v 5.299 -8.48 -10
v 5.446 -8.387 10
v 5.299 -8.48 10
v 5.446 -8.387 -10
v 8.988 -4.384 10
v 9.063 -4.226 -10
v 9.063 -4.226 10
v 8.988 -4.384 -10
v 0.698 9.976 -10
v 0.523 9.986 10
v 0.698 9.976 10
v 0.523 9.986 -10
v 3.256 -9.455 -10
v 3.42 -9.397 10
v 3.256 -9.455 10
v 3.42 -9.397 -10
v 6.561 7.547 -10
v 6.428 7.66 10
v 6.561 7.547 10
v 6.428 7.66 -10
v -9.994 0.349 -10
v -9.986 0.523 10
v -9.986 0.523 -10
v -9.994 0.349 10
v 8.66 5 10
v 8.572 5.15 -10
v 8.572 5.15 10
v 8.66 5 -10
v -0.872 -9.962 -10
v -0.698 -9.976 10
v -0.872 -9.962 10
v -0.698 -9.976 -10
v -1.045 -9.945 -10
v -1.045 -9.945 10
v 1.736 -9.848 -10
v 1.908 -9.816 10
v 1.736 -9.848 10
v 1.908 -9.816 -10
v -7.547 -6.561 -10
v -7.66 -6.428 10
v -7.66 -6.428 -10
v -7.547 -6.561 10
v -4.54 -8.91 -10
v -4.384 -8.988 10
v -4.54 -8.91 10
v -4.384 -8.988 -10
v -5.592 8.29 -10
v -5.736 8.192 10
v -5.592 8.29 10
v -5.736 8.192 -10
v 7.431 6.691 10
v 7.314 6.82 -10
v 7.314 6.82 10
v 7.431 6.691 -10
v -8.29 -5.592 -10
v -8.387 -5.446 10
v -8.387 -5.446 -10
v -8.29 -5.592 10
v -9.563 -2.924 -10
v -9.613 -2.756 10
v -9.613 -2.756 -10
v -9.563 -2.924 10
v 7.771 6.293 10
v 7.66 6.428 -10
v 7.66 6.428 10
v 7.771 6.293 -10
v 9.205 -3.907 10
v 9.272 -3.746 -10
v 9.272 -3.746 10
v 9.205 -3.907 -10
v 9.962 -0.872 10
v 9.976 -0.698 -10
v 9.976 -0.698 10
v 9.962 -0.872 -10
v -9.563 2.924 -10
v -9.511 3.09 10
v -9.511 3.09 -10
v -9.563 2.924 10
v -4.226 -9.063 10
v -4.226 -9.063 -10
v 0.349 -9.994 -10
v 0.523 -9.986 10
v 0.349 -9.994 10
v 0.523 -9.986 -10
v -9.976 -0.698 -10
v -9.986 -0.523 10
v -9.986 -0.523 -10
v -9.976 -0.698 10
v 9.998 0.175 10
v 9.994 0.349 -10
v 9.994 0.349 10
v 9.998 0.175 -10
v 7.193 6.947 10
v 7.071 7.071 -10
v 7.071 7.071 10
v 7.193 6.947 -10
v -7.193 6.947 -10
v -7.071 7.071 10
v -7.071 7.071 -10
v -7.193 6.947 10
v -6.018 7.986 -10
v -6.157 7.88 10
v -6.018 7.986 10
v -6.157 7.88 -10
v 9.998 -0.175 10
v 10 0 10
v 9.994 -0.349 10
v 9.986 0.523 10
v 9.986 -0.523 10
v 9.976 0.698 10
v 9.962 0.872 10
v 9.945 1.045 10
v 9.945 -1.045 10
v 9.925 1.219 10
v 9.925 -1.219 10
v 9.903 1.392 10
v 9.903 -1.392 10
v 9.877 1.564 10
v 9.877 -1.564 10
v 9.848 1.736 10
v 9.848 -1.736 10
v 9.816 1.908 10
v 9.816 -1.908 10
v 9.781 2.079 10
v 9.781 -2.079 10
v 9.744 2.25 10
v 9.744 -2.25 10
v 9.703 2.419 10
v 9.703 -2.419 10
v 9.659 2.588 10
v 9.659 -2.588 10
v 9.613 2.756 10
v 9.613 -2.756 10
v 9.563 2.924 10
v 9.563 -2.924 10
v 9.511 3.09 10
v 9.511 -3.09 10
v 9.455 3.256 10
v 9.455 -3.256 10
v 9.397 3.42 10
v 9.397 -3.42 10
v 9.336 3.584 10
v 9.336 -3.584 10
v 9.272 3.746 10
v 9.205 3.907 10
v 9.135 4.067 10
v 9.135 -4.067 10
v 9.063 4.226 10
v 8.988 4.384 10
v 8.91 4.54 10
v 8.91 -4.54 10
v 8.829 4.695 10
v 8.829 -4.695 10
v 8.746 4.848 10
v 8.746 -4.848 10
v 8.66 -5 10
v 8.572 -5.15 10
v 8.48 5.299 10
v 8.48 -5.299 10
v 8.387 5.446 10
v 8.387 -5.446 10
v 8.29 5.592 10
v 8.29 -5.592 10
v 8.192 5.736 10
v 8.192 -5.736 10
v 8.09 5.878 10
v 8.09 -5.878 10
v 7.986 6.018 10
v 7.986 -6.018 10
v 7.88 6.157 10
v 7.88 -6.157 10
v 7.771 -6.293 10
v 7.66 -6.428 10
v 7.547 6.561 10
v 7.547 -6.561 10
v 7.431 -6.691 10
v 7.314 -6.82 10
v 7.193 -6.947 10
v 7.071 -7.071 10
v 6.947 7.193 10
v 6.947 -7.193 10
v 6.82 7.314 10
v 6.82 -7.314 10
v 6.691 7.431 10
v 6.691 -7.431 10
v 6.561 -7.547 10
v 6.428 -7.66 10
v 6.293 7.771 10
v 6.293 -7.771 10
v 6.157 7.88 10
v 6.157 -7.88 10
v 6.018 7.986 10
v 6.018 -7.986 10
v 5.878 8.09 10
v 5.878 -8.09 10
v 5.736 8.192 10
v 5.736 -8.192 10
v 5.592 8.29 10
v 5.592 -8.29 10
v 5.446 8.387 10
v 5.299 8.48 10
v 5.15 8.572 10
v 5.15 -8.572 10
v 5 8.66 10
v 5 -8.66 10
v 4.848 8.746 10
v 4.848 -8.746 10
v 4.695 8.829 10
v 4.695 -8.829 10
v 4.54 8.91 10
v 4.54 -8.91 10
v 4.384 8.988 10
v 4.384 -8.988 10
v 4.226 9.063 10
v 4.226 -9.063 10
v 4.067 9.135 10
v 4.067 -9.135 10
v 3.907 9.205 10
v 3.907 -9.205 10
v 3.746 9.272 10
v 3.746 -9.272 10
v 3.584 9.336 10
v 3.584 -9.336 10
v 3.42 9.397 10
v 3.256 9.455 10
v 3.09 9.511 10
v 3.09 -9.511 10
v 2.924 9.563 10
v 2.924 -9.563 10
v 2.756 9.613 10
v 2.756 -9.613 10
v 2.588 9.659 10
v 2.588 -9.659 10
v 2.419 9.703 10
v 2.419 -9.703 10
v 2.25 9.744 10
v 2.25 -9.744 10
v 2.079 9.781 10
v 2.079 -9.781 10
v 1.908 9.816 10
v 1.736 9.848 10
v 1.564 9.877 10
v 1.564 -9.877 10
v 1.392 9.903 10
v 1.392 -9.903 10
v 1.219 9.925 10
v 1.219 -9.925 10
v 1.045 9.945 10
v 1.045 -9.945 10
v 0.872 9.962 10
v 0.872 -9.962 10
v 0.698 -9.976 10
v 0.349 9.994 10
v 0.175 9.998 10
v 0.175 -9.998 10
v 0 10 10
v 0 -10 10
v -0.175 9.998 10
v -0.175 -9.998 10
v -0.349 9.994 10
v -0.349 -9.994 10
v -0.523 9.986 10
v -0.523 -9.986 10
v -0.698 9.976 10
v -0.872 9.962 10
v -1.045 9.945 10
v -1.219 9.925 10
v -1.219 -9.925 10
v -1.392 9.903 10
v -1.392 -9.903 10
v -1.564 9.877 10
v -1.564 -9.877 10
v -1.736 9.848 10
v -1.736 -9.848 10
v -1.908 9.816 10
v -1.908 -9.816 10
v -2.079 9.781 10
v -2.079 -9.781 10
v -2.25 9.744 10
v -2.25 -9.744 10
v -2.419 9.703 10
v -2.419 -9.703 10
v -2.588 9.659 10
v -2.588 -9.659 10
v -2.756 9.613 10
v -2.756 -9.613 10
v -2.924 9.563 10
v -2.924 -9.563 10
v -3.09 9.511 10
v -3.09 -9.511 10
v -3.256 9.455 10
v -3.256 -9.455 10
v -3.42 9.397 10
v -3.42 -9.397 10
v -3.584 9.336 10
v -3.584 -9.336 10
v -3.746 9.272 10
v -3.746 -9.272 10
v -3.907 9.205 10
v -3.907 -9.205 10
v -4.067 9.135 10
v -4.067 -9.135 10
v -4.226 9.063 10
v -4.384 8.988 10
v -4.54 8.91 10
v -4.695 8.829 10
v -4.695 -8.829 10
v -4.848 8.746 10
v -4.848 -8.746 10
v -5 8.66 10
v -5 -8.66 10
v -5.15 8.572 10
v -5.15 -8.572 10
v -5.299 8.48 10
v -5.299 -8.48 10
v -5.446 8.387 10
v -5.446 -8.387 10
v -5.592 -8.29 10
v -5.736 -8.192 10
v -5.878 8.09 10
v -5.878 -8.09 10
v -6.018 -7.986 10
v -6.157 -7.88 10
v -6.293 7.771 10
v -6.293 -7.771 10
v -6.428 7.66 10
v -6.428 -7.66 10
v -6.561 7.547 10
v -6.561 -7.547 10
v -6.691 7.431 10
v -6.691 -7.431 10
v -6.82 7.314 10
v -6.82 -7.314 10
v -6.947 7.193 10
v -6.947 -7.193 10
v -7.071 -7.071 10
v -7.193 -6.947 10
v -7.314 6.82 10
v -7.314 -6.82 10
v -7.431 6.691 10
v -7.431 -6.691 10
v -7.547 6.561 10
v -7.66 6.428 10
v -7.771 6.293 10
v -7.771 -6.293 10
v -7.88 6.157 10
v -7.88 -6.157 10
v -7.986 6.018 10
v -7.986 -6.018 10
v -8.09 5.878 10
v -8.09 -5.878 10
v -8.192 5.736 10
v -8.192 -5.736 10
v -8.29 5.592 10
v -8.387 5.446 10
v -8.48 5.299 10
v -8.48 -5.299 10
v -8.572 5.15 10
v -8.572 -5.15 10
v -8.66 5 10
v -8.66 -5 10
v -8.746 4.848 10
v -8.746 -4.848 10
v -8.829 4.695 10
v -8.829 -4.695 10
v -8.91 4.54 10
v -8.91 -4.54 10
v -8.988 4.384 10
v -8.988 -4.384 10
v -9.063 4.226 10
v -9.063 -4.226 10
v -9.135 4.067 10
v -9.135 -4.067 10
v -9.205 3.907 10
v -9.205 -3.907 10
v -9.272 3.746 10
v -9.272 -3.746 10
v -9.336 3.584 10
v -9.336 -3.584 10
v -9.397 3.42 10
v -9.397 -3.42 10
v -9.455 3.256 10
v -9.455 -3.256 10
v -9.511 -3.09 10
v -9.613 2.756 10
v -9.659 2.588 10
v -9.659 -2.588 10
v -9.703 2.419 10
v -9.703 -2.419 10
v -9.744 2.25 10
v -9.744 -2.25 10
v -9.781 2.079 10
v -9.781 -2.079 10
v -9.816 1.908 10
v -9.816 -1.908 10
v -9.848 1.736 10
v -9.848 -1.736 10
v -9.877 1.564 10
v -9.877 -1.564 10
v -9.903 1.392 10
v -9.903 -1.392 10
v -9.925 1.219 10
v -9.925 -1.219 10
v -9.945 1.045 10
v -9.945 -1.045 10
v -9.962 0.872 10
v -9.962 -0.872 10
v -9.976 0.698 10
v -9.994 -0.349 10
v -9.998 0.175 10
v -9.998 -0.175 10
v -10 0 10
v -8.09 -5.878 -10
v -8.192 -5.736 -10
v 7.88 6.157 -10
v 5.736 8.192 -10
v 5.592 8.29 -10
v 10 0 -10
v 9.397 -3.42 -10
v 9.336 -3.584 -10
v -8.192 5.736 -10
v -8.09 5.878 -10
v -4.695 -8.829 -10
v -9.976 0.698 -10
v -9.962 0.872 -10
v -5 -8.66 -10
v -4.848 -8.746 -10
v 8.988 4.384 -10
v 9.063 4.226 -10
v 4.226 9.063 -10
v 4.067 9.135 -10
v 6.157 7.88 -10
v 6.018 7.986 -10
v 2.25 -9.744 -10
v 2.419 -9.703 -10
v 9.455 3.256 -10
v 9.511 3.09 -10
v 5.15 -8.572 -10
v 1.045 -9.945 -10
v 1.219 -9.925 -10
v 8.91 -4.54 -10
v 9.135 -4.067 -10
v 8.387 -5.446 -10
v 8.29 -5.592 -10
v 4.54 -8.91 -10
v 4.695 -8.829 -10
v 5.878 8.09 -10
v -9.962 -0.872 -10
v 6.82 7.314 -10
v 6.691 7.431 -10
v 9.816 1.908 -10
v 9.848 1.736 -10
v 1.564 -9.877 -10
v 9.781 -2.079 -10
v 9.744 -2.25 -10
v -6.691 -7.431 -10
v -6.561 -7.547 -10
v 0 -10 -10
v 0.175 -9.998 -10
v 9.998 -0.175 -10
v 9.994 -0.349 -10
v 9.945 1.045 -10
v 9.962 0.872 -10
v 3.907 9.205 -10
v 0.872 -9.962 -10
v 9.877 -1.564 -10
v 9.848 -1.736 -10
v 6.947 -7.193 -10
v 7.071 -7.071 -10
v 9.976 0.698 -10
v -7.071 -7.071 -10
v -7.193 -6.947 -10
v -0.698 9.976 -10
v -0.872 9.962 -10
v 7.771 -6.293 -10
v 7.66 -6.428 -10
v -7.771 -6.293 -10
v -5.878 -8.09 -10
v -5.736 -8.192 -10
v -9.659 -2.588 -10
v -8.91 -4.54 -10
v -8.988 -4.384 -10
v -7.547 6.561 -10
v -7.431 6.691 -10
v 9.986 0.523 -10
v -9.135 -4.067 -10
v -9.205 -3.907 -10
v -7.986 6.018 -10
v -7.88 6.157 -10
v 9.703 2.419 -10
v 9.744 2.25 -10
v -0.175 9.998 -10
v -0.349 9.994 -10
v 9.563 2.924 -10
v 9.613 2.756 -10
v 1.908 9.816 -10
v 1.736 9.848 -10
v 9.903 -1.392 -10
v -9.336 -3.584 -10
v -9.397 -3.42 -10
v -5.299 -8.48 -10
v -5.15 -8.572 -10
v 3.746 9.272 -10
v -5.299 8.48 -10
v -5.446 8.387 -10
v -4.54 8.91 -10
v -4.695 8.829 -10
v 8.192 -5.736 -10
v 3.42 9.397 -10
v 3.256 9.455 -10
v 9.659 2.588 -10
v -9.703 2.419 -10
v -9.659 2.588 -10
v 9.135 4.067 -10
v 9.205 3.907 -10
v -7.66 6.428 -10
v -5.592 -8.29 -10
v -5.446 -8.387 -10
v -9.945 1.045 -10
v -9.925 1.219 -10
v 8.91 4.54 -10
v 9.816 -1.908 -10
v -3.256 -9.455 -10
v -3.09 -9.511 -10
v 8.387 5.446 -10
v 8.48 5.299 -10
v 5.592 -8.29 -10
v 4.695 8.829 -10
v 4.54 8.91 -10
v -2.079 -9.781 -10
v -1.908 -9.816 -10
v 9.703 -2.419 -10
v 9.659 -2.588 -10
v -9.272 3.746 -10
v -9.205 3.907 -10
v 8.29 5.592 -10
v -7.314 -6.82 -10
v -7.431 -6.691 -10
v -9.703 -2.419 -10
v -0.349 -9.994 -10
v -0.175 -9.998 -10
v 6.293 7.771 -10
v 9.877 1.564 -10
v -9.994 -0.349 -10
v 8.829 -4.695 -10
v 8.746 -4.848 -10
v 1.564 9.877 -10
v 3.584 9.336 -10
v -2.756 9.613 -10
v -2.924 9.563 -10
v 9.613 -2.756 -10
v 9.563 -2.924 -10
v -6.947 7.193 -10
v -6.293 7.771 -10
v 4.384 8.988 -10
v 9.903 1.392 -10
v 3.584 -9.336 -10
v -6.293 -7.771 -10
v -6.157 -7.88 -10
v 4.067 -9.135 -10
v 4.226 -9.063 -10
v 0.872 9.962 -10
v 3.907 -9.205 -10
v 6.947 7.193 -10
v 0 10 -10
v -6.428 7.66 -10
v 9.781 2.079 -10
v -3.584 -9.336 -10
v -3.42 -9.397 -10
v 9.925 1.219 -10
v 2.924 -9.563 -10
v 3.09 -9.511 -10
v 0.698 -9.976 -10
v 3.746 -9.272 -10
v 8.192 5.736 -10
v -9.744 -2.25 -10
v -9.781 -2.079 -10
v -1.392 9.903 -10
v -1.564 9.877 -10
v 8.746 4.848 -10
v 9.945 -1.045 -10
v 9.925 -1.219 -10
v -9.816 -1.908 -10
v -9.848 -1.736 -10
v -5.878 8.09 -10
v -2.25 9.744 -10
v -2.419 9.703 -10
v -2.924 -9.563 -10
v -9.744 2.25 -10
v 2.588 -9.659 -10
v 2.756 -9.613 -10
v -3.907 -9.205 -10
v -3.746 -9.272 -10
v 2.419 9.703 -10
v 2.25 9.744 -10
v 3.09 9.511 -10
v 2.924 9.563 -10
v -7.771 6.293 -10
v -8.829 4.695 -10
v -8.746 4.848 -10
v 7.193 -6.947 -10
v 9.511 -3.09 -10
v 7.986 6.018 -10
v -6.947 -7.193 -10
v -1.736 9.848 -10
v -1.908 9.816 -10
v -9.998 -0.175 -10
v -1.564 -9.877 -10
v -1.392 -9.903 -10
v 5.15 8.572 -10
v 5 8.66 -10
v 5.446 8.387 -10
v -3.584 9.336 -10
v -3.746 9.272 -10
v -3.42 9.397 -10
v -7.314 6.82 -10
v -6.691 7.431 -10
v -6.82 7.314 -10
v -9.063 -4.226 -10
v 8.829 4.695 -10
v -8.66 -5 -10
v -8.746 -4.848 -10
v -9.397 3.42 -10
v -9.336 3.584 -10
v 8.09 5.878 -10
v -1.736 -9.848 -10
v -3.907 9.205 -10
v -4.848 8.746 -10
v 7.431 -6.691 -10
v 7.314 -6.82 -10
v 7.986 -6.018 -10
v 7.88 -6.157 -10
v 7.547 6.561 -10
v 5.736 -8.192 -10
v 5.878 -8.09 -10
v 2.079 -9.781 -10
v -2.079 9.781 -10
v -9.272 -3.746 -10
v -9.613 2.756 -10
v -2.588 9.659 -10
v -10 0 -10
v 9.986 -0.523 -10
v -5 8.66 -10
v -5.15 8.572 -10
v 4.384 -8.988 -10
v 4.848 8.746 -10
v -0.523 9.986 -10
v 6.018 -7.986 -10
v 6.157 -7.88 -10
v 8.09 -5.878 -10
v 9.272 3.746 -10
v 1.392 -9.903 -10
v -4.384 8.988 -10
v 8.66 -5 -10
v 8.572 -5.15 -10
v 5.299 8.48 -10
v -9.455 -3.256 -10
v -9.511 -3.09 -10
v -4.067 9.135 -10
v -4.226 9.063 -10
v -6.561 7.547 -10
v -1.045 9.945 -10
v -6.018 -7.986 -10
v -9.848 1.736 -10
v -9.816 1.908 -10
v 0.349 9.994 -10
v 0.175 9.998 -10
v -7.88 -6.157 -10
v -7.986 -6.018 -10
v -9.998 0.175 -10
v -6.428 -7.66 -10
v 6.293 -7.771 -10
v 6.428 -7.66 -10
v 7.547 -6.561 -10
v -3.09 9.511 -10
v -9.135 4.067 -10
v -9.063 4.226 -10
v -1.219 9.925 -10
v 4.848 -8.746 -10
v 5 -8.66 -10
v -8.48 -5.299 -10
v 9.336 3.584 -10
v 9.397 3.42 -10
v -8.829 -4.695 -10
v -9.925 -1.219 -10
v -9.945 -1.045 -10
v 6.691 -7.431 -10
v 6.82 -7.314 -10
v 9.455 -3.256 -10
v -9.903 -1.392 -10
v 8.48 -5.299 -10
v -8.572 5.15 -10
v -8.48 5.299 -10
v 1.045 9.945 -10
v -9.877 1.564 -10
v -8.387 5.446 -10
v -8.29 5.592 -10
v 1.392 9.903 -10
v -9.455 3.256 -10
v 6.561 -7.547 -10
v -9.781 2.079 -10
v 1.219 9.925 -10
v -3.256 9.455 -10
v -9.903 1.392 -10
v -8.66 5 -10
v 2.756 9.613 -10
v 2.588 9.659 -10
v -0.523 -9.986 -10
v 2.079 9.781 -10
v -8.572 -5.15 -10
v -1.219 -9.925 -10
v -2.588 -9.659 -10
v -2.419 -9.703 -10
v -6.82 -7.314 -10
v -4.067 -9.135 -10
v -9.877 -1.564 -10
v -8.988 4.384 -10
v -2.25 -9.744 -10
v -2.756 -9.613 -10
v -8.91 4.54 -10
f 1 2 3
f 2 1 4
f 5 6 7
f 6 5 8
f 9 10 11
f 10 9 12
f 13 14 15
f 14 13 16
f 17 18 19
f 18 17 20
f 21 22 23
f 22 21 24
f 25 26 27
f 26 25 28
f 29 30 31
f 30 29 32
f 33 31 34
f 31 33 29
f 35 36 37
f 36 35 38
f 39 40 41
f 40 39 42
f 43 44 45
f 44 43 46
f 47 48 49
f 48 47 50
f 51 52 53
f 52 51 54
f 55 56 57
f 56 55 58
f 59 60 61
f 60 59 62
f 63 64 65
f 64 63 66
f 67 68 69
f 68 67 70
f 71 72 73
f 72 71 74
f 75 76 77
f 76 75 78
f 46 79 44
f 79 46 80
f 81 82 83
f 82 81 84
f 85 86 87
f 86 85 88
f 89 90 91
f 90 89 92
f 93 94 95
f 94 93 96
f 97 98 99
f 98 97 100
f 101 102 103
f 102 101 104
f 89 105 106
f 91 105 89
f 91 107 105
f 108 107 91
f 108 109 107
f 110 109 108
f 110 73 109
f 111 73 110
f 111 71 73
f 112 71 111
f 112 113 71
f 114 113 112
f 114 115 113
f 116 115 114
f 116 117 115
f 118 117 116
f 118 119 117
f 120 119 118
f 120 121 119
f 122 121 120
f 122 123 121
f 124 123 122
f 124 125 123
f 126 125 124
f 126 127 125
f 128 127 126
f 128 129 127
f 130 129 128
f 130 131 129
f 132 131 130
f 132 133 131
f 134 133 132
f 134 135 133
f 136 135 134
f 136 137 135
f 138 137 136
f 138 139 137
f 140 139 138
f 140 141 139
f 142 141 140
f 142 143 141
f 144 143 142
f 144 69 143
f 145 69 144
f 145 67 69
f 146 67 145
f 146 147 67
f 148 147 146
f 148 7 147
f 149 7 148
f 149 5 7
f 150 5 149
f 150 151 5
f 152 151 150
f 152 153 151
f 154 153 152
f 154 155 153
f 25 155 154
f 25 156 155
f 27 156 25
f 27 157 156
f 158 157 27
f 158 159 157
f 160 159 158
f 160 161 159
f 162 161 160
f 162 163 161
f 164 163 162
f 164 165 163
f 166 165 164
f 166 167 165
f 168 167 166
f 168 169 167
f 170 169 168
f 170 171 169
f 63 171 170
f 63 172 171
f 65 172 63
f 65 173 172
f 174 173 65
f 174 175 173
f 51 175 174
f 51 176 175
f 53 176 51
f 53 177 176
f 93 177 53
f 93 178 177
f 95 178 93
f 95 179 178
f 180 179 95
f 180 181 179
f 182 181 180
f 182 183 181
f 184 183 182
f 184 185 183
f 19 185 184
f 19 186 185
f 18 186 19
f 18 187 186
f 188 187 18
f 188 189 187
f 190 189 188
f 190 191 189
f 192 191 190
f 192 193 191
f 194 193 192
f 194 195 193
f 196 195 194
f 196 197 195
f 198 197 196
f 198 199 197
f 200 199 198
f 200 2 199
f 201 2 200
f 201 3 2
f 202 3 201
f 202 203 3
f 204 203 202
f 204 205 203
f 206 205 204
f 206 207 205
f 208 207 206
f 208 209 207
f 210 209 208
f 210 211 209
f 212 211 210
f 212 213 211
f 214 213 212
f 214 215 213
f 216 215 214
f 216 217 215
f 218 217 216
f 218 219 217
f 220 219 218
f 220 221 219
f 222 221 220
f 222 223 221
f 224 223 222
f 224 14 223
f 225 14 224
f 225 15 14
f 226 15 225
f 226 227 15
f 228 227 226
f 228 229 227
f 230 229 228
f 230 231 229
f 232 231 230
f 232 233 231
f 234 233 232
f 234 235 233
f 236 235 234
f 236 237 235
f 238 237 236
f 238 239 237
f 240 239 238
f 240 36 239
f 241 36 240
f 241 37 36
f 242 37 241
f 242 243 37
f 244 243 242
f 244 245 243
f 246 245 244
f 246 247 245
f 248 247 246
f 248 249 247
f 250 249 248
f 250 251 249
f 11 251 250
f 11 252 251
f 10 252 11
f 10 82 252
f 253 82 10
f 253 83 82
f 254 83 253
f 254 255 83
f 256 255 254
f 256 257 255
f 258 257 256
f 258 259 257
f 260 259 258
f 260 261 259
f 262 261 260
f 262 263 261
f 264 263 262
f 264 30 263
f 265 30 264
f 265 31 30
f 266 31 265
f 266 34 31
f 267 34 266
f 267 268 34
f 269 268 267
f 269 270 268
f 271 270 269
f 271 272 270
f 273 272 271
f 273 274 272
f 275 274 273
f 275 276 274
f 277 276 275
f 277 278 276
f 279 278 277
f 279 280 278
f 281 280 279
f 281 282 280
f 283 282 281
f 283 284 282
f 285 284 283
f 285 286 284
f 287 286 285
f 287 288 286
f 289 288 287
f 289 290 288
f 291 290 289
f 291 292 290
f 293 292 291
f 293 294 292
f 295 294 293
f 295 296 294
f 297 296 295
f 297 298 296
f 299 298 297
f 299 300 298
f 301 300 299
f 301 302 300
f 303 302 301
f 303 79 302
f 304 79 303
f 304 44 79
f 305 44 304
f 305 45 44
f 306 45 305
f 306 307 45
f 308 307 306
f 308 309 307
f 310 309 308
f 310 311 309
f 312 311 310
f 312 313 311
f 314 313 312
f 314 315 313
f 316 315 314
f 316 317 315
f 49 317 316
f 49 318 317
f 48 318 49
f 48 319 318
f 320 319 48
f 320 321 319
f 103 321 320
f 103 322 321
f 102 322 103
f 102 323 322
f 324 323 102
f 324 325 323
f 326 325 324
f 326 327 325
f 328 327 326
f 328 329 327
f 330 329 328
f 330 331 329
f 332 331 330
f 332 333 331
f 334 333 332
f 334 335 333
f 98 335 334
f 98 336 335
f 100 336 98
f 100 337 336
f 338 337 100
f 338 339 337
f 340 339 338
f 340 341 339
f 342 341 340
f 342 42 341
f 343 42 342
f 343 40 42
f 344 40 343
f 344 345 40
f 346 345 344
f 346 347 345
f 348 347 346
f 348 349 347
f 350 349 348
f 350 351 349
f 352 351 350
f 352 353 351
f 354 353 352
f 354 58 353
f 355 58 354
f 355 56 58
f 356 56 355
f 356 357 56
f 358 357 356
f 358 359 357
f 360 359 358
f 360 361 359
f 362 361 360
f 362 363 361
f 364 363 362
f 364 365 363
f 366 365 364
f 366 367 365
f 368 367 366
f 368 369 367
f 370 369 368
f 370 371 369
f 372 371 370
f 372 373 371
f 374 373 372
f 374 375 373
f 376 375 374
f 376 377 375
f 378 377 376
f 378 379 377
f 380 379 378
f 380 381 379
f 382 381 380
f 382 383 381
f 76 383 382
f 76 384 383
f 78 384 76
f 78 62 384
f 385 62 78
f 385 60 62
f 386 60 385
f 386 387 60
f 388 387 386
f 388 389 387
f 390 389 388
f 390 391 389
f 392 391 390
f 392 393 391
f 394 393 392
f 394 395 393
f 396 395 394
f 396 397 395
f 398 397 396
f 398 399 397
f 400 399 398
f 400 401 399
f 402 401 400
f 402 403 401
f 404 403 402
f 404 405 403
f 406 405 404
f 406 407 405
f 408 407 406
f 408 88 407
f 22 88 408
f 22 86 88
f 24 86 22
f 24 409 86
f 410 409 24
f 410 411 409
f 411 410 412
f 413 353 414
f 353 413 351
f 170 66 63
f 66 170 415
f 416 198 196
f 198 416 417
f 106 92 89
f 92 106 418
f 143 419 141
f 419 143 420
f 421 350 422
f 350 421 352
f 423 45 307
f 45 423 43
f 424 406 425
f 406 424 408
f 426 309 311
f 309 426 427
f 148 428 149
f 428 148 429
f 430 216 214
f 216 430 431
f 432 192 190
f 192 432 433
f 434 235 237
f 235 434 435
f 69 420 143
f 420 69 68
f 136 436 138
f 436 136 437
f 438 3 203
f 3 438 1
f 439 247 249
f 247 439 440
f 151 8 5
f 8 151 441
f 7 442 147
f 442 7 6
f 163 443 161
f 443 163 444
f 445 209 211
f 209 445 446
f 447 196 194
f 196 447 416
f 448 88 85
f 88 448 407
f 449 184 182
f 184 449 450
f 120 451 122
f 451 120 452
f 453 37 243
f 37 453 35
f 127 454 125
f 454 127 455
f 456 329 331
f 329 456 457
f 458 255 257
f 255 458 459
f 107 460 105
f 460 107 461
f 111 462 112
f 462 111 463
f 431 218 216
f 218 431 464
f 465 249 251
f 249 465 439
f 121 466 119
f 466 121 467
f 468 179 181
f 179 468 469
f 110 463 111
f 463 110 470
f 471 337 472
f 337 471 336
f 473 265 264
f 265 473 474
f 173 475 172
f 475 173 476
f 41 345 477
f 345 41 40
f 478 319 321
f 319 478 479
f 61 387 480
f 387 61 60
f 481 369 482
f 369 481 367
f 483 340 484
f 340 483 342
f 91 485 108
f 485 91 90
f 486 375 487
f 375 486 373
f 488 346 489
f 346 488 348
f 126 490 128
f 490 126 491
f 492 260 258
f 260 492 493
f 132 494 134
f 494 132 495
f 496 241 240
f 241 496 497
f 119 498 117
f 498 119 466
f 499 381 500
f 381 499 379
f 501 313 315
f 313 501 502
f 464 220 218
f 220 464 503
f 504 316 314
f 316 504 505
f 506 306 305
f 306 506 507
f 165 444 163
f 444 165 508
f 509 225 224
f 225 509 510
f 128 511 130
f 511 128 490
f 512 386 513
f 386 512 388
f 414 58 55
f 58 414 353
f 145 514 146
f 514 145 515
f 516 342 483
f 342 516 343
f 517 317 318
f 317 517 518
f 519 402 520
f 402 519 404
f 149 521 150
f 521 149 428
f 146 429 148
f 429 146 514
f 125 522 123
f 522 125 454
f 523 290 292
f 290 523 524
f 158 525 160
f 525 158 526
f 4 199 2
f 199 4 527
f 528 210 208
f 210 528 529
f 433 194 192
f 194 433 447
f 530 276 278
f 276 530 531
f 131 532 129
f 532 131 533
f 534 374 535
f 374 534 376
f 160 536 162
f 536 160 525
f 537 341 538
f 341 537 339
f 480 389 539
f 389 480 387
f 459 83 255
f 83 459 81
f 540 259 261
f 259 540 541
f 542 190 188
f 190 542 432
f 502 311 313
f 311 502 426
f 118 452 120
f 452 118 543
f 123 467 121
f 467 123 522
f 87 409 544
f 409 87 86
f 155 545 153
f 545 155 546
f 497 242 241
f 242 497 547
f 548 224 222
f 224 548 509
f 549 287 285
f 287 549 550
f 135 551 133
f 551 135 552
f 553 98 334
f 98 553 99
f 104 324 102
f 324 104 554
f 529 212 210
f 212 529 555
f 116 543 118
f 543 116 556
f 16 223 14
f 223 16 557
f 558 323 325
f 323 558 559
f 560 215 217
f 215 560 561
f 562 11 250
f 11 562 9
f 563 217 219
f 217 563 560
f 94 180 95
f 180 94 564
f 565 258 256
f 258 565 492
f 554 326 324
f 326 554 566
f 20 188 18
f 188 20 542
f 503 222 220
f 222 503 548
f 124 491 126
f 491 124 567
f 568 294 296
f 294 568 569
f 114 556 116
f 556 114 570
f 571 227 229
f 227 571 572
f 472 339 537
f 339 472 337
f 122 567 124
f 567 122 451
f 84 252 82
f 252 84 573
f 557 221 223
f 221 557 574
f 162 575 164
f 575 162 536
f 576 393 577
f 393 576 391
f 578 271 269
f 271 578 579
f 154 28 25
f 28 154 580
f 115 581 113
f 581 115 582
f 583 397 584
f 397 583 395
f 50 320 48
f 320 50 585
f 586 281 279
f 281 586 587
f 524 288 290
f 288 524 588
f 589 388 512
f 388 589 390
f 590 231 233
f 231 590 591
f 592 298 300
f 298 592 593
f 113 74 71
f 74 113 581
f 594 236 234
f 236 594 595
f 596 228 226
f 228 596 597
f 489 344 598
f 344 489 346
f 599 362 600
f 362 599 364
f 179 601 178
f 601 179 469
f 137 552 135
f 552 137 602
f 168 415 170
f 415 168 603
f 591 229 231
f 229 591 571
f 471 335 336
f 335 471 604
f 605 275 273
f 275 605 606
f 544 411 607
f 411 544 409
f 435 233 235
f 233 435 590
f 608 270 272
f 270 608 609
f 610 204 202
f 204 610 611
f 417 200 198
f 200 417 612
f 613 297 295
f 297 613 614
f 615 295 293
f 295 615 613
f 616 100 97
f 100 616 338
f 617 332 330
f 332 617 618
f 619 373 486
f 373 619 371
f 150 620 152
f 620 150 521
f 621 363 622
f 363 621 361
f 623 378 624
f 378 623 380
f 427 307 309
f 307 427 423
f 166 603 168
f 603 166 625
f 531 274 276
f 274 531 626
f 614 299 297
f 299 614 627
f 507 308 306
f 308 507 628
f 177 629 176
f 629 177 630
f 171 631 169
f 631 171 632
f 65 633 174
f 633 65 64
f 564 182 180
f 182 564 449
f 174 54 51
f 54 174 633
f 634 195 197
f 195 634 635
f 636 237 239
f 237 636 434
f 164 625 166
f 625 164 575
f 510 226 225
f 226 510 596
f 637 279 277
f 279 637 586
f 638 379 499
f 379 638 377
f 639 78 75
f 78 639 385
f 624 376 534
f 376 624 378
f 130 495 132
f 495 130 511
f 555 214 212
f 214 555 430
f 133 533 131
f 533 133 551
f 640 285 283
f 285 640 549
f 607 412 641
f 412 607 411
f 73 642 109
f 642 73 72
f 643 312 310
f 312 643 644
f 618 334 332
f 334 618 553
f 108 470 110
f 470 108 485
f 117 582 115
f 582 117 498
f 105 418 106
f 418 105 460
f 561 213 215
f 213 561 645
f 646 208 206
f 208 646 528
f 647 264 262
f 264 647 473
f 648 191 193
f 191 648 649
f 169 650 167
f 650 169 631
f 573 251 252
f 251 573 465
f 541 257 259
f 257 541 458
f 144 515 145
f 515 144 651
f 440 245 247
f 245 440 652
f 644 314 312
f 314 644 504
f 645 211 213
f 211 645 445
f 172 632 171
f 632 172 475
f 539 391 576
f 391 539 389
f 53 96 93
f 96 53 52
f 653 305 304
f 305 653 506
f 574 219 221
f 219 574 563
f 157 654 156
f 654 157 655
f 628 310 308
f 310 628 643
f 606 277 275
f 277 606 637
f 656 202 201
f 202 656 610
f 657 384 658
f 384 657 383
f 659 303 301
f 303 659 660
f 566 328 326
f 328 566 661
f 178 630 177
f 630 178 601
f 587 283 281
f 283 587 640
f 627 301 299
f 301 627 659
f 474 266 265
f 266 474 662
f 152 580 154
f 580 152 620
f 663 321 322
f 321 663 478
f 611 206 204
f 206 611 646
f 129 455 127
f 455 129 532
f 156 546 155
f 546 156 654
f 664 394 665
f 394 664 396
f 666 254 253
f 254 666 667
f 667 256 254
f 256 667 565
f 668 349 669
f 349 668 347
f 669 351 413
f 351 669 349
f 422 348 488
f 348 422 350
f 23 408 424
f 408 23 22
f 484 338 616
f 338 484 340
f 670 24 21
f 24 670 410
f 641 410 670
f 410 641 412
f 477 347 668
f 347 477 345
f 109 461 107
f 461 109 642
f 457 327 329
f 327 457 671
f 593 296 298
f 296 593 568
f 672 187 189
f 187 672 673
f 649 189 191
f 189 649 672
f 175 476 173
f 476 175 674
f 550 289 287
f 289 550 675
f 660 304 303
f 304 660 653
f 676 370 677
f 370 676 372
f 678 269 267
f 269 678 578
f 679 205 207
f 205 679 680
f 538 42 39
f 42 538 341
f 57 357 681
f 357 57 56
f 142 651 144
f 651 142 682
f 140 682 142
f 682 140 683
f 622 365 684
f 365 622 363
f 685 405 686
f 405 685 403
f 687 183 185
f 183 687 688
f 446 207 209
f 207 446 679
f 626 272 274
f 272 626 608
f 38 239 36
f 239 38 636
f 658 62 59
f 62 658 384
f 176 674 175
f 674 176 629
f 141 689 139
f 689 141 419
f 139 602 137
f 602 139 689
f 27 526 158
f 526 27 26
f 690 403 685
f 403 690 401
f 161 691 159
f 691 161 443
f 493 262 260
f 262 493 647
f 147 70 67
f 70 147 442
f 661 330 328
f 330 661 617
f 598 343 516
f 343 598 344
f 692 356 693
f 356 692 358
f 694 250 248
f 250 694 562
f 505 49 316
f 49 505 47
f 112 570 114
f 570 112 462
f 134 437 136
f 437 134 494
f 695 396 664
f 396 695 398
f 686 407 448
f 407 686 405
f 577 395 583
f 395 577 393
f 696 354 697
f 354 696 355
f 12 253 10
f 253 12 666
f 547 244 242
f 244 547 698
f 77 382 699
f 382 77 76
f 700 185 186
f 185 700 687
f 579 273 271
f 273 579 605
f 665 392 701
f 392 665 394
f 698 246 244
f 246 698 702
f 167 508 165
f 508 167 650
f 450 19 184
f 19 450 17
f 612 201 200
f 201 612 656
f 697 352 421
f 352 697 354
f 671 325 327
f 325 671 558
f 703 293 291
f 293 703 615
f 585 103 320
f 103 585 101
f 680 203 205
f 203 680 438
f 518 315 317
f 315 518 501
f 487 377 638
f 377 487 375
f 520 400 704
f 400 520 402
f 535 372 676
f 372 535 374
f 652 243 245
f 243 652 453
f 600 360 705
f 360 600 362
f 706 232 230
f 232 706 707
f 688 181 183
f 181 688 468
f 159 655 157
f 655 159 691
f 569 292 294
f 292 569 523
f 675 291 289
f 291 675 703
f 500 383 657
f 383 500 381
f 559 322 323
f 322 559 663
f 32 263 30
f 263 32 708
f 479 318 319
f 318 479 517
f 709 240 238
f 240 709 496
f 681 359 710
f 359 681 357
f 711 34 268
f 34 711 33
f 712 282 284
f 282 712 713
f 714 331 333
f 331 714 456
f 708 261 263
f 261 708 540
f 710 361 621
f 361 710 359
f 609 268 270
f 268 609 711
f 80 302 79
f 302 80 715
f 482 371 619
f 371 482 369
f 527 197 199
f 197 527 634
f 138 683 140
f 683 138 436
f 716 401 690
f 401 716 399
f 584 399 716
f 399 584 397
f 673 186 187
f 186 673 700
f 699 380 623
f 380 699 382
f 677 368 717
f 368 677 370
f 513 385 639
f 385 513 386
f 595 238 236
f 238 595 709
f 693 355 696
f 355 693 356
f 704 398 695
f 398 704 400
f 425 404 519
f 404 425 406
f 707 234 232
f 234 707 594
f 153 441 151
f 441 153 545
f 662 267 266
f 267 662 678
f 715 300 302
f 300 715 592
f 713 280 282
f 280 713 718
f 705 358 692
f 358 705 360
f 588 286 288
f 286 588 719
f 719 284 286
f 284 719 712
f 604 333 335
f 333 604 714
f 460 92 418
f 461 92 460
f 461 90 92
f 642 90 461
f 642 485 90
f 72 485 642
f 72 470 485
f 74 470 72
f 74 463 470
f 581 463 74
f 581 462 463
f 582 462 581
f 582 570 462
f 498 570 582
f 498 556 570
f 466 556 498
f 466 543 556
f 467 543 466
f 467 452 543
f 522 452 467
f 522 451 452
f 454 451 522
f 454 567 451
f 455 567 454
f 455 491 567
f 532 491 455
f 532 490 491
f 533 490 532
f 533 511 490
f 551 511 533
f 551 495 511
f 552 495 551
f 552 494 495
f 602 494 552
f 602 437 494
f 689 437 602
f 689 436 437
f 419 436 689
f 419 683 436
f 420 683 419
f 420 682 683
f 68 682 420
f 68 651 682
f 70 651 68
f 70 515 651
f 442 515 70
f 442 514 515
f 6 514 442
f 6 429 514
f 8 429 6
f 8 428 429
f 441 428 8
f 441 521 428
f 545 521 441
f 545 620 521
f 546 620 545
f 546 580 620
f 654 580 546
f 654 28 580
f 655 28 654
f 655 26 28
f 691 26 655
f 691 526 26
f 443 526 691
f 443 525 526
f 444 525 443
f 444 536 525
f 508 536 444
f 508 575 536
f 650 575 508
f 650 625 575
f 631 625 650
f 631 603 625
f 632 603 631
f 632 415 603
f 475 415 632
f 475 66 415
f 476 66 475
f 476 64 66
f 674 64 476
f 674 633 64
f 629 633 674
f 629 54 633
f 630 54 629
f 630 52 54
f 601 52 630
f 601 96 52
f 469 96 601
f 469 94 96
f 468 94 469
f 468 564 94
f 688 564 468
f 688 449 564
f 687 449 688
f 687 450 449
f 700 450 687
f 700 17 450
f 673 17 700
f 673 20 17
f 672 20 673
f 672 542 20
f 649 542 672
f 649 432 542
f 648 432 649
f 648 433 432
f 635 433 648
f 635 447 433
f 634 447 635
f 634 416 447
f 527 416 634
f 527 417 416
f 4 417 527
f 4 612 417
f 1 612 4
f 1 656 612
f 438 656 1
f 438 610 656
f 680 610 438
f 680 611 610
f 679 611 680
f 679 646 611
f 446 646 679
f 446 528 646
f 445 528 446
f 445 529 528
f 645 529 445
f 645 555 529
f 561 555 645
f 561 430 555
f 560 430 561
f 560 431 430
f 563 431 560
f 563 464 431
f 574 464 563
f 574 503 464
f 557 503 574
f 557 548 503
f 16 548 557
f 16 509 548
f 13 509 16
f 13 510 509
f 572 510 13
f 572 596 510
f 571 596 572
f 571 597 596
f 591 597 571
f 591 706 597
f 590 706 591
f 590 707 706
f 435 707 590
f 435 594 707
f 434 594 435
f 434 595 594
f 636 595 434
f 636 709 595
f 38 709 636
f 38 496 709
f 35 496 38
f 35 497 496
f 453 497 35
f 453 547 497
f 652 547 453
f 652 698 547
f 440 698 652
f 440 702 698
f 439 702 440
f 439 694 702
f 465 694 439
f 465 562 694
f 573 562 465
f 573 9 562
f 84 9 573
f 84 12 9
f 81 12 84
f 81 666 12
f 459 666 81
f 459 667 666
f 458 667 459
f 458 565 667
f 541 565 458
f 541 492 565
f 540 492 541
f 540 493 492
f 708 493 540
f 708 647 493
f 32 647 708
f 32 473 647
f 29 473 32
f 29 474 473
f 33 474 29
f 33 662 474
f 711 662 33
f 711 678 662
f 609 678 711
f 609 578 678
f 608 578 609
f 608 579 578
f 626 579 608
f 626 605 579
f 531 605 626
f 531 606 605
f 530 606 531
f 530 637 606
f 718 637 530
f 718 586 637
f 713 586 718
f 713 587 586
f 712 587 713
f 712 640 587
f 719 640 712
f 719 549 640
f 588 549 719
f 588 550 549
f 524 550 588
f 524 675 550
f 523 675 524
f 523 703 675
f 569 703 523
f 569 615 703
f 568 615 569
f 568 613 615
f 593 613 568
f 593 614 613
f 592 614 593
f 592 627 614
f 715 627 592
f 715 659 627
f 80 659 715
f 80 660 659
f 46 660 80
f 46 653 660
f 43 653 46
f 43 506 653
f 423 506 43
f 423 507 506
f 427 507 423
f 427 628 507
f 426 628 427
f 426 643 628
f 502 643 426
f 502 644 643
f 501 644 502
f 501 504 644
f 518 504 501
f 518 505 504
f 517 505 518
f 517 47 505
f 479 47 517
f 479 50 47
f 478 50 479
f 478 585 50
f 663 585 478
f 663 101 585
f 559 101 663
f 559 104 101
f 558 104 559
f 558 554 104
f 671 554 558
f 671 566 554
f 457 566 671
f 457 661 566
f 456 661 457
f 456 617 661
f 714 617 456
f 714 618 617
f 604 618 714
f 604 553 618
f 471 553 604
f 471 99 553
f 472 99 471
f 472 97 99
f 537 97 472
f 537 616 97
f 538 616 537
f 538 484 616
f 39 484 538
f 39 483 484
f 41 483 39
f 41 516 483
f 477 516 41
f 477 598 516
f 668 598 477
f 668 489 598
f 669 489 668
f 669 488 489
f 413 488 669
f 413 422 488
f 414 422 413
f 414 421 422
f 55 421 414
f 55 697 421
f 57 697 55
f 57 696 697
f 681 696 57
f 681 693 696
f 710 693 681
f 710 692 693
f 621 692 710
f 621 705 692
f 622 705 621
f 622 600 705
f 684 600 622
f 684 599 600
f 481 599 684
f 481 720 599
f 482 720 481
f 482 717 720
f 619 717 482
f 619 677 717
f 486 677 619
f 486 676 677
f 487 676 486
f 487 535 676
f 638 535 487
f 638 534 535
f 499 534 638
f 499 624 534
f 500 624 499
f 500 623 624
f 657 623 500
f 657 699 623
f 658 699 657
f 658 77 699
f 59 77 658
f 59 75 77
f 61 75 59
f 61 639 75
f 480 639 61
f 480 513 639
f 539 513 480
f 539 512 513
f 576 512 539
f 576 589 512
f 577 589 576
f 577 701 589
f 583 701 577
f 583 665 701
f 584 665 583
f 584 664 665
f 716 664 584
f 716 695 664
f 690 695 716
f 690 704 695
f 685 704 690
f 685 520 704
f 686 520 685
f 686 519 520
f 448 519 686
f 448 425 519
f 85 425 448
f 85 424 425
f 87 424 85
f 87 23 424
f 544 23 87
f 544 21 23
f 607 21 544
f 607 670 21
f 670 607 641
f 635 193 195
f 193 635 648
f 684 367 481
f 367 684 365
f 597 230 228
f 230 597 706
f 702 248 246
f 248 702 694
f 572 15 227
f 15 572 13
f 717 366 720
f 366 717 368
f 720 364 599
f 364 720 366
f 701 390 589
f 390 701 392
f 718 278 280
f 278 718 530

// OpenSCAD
/*
 ******************************************************************************************
 *                                                                                        *
 *                     The autoclave with cutted cone form inside                         *
 *                                                                                        *
 ******************************************************************************************
 * The cutted cone volume:                                                                *
 *   V (cut. cone) = 1/3 * pi * h(cone) * (r1^2 + r1 * r2 + r2^2)                         *
 *                                                                                        *
 * Therefore the volume of two cutted cone plus the cylinder is:                          *
 *   V (full) = 2/3 * pi * h(cone) * (r1^2 + r1 * r2 + r2^2) + pi * H(cylinder) * r1^2    *
 *                                                                                        *
 * From WolframAlpha:                                                                     *
 *   V = 2/3* pi*5*(8^2 + 8*1.5 + 1.5^2) + pi*6*8^2 = 2025                                *
 ******************************************************************************************
 */


/*
 ******************************************************************************************
 * Set SHOW to true to look inside the cylinder.                                          *
 * Otherwise set SHOW to false to the final rendering.                                    *
 ******************************************************************************************
 */
SHOW = true;


/*
 ******************************************************************************************
 *                               Variables                                                *
 ******************************************************************************************
 */
h_wall = 2;

d1_insideCuttedCone = 16;
d2_insideCuttedCone = 3;
h_insideCuttedCone = 5;

h_insideCylinder = 6;

d_outsideCylinder = d1_insideCuttedCone + h_wall*2;
h_outsideCylinder = h_insideCuttedCone*2 + h_insideCylinder + h_wall*2;


/*
 ******************************************************************************************
 *                               Modules                                                  *
 ******************************************************************************************
 */
module insideVolume()
{
	module insideCuttedCone()
	{
		translate([0, 0, h_insideCylinder/2]) cylinder(d1 = d1_insideCuttedCone, d2 = d2_insideCuttedCone, h = h_insideCuttedCone, $fn=360, center=false);
	}

	insideCuttedCone();
	mirror([0,0,1]) insideCuttedCone();

	cylinder(h = h_insideCylinder, d = d1_insideCuttedCone, $fn = 360, center=true);
}


/*
 ******************************************************************************************
 *                               Two Kind of Main                                         *
 ******************************************************************************************
 */
module diffMain()
{
	difference()
	{
		cylinder(d = d_outsideCylinder, h = h_outsideCylinder, $fn = 360, center=true);
		insideVolume();
	}
}


module showMain()
{
		insideVolume();
		#cylinder(d = d_outsideCylinder, h = h_outsideCylinder, $fn = 360, center=true);
}


module main()
{
	if (SHOW)
	{
		showMain();
	}
	else
		diffMain();
}


/*
 ******************************************************************************************
 *                                     Main                                               *
 ******************************************************************************************
 */
main();
